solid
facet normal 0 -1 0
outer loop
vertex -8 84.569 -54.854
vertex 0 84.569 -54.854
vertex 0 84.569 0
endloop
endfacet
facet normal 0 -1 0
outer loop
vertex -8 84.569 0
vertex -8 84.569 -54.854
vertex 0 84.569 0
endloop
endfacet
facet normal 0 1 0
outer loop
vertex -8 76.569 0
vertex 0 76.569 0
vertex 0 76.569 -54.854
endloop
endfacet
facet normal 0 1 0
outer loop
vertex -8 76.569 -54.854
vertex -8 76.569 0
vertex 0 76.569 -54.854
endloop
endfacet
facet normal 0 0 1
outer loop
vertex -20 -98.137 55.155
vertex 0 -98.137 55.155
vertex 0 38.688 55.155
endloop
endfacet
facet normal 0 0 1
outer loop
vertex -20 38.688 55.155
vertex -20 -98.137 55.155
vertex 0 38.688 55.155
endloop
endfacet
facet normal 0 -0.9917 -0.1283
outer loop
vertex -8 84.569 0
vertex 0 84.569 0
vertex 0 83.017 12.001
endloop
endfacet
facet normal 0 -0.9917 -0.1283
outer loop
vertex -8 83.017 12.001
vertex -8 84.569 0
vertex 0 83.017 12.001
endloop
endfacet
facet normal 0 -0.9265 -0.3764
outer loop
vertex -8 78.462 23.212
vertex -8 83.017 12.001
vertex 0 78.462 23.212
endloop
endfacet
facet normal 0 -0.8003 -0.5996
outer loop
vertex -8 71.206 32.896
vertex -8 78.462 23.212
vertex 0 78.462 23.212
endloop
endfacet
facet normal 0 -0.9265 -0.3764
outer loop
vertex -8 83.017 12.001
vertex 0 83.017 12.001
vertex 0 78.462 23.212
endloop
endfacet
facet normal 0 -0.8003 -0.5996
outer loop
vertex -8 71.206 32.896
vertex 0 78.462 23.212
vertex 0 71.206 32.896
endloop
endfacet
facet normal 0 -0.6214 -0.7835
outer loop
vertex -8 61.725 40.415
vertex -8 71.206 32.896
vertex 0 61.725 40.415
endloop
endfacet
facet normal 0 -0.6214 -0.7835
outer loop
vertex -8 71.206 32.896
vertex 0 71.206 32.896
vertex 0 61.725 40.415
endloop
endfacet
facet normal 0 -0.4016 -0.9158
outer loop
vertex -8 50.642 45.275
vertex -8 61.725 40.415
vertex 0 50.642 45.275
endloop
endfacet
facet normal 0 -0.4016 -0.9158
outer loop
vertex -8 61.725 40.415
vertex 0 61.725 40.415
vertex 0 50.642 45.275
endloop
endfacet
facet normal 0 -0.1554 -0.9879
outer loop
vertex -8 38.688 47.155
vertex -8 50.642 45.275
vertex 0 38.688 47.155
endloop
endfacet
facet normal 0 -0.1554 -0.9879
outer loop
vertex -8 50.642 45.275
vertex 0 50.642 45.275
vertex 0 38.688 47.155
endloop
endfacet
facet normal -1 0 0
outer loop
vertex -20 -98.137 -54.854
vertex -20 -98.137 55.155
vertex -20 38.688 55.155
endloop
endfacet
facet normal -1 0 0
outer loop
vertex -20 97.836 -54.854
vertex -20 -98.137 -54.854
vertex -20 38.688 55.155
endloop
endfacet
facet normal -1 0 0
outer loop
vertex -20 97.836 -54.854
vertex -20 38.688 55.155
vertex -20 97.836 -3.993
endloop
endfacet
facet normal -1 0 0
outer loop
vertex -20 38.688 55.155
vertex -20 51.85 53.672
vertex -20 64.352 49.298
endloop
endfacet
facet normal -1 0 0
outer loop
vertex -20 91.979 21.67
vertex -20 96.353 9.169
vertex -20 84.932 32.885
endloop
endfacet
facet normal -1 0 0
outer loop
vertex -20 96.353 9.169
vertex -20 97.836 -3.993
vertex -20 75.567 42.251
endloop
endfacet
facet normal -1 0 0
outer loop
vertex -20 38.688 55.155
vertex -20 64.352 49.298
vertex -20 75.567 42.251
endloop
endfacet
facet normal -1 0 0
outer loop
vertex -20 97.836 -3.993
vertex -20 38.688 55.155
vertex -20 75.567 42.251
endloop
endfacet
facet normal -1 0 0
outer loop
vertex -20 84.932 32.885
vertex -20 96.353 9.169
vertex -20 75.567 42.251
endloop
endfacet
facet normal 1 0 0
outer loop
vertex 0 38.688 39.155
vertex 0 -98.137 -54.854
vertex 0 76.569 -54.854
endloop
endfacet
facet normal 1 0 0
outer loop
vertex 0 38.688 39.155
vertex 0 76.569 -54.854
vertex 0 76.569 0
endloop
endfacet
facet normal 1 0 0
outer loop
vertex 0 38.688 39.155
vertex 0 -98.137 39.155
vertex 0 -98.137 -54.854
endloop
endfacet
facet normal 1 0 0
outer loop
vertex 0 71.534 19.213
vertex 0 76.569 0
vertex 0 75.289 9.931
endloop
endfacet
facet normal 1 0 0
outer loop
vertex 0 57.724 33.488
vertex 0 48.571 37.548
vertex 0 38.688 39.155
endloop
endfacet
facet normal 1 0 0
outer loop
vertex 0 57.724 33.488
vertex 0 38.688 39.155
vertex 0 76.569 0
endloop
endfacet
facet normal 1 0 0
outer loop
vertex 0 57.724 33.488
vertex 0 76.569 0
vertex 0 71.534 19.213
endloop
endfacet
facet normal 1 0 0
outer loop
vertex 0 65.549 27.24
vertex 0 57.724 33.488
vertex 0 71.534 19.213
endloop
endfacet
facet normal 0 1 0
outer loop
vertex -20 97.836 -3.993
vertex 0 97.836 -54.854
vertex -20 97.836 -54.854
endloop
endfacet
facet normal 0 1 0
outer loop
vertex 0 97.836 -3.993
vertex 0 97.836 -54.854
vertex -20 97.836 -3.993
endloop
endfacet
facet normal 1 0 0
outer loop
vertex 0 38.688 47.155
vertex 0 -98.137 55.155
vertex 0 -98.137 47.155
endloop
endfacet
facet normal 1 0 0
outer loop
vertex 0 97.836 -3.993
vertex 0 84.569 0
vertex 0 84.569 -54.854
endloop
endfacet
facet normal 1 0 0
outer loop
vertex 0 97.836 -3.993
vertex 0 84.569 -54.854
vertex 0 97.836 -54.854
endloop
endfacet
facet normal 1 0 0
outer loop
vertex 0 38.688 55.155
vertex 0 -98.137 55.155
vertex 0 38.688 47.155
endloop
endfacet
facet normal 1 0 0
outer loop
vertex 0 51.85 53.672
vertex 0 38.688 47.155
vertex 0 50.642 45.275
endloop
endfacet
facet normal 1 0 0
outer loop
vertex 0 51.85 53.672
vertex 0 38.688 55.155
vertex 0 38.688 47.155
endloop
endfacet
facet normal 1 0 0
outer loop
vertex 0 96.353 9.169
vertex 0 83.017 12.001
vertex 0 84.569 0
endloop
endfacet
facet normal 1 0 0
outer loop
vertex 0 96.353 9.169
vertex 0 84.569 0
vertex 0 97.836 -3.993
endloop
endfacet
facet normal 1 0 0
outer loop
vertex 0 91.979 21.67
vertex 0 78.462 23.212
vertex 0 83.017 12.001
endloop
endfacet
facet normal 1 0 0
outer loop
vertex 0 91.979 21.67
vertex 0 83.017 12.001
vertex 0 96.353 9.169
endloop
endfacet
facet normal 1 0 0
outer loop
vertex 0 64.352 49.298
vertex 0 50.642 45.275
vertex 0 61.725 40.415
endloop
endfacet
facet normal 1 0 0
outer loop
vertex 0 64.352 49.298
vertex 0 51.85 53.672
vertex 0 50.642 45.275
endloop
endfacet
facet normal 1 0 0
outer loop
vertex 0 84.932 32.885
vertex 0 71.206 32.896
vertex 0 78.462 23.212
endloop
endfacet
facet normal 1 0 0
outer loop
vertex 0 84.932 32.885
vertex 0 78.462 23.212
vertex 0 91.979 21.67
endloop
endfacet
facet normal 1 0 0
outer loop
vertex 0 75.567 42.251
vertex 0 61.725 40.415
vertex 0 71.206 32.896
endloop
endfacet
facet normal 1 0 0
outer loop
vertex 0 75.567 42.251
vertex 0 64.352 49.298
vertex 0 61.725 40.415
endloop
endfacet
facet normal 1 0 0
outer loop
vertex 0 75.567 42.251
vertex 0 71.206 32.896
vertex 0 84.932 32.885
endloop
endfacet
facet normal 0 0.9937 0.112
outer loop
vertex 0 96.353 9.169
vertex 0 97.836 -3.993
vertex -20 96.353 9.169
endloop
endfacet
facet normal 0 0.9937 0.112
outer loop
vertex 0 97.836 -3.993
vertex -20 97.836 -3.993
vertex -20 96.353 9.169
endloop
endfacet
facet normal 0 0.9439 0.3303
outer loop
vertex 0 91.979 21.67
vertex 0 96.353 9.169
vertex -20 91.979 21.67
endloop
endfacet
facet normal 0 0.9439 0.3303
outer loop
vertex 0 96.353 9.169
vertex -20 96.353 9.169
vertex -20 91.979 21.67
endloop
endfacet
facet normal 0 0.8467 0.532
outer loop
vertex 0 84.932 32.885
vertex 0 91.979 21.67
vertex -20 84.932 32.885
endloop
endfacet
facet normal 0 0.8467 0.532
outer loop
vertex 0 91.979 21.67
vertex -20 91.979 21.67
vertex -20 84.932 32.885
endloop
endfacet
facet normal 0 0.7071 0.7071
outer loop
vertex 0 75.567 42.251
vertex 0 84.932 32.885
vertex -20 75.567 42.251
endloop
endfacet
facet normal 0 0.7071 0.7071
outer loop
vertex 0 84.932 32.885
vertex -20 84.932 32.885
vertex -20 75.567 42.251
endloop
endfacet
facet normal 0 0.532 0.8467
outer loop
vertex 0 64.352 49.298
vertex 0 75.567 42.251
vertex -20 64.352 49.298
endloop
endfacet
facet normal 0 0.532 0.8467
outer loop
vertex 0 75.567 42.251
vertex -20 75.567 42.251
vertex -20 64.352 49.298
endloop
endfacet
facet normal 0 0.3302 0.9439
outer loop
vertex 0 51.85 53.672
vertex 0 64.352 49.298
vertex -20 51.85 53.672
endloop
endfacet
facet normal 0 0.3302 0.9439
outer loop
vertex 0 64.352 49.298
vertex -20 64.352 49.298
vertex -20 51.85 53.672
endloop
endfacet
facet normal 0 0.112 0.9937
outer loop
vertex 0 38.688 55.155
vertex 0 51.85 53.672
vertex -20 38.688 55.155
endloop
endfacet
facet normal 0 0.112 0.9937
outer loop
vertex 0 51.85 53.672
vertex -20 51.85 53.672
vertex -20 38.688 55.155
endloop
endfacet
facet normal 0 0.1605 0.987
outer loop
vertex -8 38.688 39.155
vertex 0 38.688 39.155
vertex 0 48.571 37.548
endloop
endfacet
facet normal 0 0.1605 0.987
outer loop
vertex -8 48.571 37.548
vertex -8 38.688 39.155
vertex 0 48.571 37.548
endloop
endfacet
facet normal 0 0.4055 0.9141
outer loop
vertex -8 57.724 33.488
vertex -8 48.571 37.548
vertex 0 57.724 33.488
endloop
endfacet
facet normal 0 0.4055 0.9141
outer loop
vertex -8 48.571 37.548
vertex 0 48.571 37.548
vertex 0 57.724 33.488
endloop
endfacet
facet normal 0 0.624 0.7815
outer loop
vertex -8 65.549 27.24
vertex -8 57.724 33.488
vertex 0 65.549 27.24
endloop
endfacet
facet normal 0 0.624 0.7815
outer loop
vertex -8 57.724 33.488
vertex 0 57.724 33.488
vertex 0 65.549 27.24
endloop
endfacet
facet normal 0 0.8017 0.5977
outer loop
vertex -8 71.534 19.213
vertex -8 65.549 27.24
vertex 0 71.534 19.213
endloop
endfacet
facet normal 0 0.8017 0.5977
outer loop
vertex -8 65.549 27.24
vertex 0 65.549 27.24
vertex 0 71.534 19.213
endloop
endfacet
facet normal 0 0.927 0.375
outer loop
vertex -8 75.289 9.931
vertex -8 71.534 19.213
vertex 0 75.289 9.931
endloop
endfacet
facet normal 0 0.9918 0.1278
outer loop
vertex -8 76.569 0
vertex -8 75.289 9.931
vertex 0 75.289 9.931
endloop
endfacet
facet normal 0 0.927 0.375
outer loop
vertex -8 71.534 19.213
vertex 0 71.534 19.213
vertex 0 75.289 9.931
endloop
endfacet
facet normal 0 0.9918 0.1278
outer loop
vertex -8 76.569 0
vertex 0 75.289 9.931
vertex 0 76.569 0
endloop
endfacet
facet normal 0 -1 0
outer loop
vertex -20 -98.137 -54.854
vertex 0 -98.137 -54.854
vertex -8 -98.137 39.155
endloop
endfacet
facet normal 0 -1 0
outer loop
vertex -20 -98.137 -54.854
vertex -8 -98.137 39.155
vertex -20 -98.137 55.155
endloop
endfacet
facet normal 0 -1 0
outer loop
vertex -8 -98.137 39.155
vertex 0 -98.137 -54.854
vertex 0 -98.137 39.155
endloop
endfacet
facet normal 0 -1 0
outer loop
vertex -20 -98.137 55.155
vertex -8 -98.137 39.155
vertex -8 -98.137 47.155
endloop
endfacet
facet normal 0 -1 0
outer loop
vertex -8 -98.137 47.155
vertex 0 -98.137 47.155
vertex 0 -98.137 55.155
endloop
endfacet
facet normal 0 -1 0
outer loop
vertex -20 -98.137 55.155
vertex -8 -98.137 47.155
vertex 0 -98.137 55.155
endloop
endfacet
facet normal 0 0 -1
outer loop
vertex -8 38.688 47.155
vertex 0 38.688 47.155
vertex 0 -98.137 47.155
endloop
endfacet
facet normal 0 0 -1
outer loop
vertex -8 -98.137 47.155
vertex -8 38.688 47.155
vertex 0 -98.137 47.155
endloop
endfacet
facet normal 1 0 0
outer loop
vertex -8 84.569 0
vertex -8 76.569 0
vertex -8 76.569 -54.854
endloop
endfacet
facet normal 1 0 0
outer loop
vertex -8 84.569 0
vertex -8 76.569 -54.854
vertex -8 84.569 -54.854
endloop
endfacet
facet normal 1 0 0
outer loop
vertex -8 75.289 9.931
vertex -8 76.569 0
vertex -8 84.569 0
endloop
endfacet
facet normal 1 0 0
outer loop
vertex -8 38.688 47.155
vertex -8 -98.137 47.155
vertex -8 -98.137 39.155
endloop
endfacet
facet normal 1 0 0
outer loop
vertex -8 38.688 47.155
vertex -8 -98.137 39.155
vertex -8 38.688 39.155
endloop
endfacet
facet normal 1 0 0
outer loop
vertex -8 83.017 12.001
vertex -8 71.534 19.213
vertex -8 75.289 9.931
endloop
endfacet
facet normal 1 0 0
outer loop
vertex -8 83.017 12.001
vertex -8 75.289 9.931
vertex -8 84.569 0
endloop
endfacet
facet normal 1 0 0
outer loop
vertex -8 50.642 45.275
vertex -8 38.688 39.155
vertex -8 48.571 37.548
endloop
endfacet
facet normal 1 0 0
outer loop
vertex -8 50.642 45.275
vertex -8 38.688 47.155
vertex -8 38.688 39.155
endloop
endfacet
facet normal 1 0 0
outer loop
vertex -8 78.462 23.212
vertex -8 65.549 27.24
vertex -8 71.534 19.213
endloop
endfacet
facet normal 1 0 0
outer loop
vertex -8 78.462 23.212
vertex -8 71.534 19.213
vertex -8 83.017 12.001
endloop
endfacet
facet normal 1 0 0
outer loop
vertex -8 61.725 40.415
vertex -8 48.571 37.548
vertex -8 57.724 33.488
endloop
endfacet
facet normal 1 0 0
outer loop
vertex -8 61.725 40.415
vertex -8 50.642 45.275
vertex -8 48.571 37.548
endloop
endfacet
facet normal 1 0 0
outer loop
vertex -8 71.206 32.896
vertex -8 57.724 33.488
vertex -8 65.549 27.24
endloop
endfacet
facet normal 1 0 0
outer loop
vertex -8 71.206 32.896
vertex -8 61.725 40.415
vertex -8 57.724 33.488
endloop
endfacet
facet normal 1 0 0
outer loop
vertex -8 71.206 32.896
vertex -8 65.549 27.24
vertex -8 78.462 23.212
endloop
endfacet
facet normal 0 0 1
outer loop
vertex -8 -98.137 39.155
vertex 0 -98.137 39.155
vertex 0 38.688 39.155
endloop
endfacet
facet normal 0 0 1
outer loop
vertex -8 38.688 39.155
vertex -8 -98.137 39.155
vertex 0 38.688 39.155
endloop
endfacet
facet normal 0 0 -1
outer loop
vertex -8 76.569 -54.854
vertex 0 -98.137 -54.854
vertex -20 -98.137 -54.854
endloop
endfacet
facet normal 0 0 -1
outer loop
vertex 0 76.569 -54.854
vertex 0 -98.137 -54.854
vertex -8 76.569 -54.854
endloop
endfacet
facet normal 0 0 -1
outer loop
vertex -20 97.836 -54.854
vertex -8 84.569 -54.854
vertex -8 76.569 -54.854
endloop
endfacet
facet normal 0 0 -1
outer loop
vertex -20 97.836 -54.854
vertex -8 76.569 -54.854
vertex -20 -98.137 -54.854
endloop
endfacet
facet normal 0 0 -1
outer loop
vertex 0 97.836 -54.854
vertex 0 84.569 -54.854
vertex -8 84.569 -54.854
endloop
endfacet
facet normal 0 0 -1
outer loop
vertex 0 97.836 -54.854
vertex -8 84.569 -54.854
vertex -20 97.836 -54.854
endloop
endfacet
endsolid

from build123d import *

# Parameters (mm, degrees)
F0_W     = 195.9732845426
F0_H     = 110.0095510483
F1_DEPTH = 20
F2_R     = 59.148
F4_DEPTH = 8


with BuildPart() as f1:
    # F0 (on Right) → F1 (new body)
    with BuildSketch(Plane.YZ):
        with Locations((-0.1502893865, 0.1502856612)):
            Rectangle(F0_W, F0_H)
    extrude(amount=-F1_DEPTH)

    # F2
    f2_edges = [f1.edges().sort_by_distance(p)[0] for p in [
        (-10, 97.836353, 55.155061),
    ]]
    fillet(f2_edges, radius=F2_R)

    # F3 (on face) → F4 (cut)
    with BuildSketch(Plane.YZ):
        with BuildLine():
            Line((38.6883528848, 47.1550611854), (-98.1369316578, 47.1550611854))
            Line((-98.1369316578, 47.1550611854), (-98.1369316578, 39.1550611854))
            Line((-98.1369316578, 39.1550611854), (38.6883528848, 39.1550611854))
            ThreePointArc((38.6883528848, 39.1550611854), (65.5487139379, 27.2398659264), (76.5687220266, 0))
            Line((76.5687220266, 0), (76.5687220266, -54.8544898629))
            Line((76.5687220266, -54.8544898629), (84.5687220266, -54.8544898629))
            Line((84.5687220266, -54.8544898629), (84.5687220266, 0))
            ThreePointArc((84.5687220266, 0), (71.2059826894, 32.896079052), (38.6883528848, 47.1550611854))
        make_face()
    extrude(amount=-F4_DEPTH, mode=Mode.SUBTRACT)


solid = f1.part
